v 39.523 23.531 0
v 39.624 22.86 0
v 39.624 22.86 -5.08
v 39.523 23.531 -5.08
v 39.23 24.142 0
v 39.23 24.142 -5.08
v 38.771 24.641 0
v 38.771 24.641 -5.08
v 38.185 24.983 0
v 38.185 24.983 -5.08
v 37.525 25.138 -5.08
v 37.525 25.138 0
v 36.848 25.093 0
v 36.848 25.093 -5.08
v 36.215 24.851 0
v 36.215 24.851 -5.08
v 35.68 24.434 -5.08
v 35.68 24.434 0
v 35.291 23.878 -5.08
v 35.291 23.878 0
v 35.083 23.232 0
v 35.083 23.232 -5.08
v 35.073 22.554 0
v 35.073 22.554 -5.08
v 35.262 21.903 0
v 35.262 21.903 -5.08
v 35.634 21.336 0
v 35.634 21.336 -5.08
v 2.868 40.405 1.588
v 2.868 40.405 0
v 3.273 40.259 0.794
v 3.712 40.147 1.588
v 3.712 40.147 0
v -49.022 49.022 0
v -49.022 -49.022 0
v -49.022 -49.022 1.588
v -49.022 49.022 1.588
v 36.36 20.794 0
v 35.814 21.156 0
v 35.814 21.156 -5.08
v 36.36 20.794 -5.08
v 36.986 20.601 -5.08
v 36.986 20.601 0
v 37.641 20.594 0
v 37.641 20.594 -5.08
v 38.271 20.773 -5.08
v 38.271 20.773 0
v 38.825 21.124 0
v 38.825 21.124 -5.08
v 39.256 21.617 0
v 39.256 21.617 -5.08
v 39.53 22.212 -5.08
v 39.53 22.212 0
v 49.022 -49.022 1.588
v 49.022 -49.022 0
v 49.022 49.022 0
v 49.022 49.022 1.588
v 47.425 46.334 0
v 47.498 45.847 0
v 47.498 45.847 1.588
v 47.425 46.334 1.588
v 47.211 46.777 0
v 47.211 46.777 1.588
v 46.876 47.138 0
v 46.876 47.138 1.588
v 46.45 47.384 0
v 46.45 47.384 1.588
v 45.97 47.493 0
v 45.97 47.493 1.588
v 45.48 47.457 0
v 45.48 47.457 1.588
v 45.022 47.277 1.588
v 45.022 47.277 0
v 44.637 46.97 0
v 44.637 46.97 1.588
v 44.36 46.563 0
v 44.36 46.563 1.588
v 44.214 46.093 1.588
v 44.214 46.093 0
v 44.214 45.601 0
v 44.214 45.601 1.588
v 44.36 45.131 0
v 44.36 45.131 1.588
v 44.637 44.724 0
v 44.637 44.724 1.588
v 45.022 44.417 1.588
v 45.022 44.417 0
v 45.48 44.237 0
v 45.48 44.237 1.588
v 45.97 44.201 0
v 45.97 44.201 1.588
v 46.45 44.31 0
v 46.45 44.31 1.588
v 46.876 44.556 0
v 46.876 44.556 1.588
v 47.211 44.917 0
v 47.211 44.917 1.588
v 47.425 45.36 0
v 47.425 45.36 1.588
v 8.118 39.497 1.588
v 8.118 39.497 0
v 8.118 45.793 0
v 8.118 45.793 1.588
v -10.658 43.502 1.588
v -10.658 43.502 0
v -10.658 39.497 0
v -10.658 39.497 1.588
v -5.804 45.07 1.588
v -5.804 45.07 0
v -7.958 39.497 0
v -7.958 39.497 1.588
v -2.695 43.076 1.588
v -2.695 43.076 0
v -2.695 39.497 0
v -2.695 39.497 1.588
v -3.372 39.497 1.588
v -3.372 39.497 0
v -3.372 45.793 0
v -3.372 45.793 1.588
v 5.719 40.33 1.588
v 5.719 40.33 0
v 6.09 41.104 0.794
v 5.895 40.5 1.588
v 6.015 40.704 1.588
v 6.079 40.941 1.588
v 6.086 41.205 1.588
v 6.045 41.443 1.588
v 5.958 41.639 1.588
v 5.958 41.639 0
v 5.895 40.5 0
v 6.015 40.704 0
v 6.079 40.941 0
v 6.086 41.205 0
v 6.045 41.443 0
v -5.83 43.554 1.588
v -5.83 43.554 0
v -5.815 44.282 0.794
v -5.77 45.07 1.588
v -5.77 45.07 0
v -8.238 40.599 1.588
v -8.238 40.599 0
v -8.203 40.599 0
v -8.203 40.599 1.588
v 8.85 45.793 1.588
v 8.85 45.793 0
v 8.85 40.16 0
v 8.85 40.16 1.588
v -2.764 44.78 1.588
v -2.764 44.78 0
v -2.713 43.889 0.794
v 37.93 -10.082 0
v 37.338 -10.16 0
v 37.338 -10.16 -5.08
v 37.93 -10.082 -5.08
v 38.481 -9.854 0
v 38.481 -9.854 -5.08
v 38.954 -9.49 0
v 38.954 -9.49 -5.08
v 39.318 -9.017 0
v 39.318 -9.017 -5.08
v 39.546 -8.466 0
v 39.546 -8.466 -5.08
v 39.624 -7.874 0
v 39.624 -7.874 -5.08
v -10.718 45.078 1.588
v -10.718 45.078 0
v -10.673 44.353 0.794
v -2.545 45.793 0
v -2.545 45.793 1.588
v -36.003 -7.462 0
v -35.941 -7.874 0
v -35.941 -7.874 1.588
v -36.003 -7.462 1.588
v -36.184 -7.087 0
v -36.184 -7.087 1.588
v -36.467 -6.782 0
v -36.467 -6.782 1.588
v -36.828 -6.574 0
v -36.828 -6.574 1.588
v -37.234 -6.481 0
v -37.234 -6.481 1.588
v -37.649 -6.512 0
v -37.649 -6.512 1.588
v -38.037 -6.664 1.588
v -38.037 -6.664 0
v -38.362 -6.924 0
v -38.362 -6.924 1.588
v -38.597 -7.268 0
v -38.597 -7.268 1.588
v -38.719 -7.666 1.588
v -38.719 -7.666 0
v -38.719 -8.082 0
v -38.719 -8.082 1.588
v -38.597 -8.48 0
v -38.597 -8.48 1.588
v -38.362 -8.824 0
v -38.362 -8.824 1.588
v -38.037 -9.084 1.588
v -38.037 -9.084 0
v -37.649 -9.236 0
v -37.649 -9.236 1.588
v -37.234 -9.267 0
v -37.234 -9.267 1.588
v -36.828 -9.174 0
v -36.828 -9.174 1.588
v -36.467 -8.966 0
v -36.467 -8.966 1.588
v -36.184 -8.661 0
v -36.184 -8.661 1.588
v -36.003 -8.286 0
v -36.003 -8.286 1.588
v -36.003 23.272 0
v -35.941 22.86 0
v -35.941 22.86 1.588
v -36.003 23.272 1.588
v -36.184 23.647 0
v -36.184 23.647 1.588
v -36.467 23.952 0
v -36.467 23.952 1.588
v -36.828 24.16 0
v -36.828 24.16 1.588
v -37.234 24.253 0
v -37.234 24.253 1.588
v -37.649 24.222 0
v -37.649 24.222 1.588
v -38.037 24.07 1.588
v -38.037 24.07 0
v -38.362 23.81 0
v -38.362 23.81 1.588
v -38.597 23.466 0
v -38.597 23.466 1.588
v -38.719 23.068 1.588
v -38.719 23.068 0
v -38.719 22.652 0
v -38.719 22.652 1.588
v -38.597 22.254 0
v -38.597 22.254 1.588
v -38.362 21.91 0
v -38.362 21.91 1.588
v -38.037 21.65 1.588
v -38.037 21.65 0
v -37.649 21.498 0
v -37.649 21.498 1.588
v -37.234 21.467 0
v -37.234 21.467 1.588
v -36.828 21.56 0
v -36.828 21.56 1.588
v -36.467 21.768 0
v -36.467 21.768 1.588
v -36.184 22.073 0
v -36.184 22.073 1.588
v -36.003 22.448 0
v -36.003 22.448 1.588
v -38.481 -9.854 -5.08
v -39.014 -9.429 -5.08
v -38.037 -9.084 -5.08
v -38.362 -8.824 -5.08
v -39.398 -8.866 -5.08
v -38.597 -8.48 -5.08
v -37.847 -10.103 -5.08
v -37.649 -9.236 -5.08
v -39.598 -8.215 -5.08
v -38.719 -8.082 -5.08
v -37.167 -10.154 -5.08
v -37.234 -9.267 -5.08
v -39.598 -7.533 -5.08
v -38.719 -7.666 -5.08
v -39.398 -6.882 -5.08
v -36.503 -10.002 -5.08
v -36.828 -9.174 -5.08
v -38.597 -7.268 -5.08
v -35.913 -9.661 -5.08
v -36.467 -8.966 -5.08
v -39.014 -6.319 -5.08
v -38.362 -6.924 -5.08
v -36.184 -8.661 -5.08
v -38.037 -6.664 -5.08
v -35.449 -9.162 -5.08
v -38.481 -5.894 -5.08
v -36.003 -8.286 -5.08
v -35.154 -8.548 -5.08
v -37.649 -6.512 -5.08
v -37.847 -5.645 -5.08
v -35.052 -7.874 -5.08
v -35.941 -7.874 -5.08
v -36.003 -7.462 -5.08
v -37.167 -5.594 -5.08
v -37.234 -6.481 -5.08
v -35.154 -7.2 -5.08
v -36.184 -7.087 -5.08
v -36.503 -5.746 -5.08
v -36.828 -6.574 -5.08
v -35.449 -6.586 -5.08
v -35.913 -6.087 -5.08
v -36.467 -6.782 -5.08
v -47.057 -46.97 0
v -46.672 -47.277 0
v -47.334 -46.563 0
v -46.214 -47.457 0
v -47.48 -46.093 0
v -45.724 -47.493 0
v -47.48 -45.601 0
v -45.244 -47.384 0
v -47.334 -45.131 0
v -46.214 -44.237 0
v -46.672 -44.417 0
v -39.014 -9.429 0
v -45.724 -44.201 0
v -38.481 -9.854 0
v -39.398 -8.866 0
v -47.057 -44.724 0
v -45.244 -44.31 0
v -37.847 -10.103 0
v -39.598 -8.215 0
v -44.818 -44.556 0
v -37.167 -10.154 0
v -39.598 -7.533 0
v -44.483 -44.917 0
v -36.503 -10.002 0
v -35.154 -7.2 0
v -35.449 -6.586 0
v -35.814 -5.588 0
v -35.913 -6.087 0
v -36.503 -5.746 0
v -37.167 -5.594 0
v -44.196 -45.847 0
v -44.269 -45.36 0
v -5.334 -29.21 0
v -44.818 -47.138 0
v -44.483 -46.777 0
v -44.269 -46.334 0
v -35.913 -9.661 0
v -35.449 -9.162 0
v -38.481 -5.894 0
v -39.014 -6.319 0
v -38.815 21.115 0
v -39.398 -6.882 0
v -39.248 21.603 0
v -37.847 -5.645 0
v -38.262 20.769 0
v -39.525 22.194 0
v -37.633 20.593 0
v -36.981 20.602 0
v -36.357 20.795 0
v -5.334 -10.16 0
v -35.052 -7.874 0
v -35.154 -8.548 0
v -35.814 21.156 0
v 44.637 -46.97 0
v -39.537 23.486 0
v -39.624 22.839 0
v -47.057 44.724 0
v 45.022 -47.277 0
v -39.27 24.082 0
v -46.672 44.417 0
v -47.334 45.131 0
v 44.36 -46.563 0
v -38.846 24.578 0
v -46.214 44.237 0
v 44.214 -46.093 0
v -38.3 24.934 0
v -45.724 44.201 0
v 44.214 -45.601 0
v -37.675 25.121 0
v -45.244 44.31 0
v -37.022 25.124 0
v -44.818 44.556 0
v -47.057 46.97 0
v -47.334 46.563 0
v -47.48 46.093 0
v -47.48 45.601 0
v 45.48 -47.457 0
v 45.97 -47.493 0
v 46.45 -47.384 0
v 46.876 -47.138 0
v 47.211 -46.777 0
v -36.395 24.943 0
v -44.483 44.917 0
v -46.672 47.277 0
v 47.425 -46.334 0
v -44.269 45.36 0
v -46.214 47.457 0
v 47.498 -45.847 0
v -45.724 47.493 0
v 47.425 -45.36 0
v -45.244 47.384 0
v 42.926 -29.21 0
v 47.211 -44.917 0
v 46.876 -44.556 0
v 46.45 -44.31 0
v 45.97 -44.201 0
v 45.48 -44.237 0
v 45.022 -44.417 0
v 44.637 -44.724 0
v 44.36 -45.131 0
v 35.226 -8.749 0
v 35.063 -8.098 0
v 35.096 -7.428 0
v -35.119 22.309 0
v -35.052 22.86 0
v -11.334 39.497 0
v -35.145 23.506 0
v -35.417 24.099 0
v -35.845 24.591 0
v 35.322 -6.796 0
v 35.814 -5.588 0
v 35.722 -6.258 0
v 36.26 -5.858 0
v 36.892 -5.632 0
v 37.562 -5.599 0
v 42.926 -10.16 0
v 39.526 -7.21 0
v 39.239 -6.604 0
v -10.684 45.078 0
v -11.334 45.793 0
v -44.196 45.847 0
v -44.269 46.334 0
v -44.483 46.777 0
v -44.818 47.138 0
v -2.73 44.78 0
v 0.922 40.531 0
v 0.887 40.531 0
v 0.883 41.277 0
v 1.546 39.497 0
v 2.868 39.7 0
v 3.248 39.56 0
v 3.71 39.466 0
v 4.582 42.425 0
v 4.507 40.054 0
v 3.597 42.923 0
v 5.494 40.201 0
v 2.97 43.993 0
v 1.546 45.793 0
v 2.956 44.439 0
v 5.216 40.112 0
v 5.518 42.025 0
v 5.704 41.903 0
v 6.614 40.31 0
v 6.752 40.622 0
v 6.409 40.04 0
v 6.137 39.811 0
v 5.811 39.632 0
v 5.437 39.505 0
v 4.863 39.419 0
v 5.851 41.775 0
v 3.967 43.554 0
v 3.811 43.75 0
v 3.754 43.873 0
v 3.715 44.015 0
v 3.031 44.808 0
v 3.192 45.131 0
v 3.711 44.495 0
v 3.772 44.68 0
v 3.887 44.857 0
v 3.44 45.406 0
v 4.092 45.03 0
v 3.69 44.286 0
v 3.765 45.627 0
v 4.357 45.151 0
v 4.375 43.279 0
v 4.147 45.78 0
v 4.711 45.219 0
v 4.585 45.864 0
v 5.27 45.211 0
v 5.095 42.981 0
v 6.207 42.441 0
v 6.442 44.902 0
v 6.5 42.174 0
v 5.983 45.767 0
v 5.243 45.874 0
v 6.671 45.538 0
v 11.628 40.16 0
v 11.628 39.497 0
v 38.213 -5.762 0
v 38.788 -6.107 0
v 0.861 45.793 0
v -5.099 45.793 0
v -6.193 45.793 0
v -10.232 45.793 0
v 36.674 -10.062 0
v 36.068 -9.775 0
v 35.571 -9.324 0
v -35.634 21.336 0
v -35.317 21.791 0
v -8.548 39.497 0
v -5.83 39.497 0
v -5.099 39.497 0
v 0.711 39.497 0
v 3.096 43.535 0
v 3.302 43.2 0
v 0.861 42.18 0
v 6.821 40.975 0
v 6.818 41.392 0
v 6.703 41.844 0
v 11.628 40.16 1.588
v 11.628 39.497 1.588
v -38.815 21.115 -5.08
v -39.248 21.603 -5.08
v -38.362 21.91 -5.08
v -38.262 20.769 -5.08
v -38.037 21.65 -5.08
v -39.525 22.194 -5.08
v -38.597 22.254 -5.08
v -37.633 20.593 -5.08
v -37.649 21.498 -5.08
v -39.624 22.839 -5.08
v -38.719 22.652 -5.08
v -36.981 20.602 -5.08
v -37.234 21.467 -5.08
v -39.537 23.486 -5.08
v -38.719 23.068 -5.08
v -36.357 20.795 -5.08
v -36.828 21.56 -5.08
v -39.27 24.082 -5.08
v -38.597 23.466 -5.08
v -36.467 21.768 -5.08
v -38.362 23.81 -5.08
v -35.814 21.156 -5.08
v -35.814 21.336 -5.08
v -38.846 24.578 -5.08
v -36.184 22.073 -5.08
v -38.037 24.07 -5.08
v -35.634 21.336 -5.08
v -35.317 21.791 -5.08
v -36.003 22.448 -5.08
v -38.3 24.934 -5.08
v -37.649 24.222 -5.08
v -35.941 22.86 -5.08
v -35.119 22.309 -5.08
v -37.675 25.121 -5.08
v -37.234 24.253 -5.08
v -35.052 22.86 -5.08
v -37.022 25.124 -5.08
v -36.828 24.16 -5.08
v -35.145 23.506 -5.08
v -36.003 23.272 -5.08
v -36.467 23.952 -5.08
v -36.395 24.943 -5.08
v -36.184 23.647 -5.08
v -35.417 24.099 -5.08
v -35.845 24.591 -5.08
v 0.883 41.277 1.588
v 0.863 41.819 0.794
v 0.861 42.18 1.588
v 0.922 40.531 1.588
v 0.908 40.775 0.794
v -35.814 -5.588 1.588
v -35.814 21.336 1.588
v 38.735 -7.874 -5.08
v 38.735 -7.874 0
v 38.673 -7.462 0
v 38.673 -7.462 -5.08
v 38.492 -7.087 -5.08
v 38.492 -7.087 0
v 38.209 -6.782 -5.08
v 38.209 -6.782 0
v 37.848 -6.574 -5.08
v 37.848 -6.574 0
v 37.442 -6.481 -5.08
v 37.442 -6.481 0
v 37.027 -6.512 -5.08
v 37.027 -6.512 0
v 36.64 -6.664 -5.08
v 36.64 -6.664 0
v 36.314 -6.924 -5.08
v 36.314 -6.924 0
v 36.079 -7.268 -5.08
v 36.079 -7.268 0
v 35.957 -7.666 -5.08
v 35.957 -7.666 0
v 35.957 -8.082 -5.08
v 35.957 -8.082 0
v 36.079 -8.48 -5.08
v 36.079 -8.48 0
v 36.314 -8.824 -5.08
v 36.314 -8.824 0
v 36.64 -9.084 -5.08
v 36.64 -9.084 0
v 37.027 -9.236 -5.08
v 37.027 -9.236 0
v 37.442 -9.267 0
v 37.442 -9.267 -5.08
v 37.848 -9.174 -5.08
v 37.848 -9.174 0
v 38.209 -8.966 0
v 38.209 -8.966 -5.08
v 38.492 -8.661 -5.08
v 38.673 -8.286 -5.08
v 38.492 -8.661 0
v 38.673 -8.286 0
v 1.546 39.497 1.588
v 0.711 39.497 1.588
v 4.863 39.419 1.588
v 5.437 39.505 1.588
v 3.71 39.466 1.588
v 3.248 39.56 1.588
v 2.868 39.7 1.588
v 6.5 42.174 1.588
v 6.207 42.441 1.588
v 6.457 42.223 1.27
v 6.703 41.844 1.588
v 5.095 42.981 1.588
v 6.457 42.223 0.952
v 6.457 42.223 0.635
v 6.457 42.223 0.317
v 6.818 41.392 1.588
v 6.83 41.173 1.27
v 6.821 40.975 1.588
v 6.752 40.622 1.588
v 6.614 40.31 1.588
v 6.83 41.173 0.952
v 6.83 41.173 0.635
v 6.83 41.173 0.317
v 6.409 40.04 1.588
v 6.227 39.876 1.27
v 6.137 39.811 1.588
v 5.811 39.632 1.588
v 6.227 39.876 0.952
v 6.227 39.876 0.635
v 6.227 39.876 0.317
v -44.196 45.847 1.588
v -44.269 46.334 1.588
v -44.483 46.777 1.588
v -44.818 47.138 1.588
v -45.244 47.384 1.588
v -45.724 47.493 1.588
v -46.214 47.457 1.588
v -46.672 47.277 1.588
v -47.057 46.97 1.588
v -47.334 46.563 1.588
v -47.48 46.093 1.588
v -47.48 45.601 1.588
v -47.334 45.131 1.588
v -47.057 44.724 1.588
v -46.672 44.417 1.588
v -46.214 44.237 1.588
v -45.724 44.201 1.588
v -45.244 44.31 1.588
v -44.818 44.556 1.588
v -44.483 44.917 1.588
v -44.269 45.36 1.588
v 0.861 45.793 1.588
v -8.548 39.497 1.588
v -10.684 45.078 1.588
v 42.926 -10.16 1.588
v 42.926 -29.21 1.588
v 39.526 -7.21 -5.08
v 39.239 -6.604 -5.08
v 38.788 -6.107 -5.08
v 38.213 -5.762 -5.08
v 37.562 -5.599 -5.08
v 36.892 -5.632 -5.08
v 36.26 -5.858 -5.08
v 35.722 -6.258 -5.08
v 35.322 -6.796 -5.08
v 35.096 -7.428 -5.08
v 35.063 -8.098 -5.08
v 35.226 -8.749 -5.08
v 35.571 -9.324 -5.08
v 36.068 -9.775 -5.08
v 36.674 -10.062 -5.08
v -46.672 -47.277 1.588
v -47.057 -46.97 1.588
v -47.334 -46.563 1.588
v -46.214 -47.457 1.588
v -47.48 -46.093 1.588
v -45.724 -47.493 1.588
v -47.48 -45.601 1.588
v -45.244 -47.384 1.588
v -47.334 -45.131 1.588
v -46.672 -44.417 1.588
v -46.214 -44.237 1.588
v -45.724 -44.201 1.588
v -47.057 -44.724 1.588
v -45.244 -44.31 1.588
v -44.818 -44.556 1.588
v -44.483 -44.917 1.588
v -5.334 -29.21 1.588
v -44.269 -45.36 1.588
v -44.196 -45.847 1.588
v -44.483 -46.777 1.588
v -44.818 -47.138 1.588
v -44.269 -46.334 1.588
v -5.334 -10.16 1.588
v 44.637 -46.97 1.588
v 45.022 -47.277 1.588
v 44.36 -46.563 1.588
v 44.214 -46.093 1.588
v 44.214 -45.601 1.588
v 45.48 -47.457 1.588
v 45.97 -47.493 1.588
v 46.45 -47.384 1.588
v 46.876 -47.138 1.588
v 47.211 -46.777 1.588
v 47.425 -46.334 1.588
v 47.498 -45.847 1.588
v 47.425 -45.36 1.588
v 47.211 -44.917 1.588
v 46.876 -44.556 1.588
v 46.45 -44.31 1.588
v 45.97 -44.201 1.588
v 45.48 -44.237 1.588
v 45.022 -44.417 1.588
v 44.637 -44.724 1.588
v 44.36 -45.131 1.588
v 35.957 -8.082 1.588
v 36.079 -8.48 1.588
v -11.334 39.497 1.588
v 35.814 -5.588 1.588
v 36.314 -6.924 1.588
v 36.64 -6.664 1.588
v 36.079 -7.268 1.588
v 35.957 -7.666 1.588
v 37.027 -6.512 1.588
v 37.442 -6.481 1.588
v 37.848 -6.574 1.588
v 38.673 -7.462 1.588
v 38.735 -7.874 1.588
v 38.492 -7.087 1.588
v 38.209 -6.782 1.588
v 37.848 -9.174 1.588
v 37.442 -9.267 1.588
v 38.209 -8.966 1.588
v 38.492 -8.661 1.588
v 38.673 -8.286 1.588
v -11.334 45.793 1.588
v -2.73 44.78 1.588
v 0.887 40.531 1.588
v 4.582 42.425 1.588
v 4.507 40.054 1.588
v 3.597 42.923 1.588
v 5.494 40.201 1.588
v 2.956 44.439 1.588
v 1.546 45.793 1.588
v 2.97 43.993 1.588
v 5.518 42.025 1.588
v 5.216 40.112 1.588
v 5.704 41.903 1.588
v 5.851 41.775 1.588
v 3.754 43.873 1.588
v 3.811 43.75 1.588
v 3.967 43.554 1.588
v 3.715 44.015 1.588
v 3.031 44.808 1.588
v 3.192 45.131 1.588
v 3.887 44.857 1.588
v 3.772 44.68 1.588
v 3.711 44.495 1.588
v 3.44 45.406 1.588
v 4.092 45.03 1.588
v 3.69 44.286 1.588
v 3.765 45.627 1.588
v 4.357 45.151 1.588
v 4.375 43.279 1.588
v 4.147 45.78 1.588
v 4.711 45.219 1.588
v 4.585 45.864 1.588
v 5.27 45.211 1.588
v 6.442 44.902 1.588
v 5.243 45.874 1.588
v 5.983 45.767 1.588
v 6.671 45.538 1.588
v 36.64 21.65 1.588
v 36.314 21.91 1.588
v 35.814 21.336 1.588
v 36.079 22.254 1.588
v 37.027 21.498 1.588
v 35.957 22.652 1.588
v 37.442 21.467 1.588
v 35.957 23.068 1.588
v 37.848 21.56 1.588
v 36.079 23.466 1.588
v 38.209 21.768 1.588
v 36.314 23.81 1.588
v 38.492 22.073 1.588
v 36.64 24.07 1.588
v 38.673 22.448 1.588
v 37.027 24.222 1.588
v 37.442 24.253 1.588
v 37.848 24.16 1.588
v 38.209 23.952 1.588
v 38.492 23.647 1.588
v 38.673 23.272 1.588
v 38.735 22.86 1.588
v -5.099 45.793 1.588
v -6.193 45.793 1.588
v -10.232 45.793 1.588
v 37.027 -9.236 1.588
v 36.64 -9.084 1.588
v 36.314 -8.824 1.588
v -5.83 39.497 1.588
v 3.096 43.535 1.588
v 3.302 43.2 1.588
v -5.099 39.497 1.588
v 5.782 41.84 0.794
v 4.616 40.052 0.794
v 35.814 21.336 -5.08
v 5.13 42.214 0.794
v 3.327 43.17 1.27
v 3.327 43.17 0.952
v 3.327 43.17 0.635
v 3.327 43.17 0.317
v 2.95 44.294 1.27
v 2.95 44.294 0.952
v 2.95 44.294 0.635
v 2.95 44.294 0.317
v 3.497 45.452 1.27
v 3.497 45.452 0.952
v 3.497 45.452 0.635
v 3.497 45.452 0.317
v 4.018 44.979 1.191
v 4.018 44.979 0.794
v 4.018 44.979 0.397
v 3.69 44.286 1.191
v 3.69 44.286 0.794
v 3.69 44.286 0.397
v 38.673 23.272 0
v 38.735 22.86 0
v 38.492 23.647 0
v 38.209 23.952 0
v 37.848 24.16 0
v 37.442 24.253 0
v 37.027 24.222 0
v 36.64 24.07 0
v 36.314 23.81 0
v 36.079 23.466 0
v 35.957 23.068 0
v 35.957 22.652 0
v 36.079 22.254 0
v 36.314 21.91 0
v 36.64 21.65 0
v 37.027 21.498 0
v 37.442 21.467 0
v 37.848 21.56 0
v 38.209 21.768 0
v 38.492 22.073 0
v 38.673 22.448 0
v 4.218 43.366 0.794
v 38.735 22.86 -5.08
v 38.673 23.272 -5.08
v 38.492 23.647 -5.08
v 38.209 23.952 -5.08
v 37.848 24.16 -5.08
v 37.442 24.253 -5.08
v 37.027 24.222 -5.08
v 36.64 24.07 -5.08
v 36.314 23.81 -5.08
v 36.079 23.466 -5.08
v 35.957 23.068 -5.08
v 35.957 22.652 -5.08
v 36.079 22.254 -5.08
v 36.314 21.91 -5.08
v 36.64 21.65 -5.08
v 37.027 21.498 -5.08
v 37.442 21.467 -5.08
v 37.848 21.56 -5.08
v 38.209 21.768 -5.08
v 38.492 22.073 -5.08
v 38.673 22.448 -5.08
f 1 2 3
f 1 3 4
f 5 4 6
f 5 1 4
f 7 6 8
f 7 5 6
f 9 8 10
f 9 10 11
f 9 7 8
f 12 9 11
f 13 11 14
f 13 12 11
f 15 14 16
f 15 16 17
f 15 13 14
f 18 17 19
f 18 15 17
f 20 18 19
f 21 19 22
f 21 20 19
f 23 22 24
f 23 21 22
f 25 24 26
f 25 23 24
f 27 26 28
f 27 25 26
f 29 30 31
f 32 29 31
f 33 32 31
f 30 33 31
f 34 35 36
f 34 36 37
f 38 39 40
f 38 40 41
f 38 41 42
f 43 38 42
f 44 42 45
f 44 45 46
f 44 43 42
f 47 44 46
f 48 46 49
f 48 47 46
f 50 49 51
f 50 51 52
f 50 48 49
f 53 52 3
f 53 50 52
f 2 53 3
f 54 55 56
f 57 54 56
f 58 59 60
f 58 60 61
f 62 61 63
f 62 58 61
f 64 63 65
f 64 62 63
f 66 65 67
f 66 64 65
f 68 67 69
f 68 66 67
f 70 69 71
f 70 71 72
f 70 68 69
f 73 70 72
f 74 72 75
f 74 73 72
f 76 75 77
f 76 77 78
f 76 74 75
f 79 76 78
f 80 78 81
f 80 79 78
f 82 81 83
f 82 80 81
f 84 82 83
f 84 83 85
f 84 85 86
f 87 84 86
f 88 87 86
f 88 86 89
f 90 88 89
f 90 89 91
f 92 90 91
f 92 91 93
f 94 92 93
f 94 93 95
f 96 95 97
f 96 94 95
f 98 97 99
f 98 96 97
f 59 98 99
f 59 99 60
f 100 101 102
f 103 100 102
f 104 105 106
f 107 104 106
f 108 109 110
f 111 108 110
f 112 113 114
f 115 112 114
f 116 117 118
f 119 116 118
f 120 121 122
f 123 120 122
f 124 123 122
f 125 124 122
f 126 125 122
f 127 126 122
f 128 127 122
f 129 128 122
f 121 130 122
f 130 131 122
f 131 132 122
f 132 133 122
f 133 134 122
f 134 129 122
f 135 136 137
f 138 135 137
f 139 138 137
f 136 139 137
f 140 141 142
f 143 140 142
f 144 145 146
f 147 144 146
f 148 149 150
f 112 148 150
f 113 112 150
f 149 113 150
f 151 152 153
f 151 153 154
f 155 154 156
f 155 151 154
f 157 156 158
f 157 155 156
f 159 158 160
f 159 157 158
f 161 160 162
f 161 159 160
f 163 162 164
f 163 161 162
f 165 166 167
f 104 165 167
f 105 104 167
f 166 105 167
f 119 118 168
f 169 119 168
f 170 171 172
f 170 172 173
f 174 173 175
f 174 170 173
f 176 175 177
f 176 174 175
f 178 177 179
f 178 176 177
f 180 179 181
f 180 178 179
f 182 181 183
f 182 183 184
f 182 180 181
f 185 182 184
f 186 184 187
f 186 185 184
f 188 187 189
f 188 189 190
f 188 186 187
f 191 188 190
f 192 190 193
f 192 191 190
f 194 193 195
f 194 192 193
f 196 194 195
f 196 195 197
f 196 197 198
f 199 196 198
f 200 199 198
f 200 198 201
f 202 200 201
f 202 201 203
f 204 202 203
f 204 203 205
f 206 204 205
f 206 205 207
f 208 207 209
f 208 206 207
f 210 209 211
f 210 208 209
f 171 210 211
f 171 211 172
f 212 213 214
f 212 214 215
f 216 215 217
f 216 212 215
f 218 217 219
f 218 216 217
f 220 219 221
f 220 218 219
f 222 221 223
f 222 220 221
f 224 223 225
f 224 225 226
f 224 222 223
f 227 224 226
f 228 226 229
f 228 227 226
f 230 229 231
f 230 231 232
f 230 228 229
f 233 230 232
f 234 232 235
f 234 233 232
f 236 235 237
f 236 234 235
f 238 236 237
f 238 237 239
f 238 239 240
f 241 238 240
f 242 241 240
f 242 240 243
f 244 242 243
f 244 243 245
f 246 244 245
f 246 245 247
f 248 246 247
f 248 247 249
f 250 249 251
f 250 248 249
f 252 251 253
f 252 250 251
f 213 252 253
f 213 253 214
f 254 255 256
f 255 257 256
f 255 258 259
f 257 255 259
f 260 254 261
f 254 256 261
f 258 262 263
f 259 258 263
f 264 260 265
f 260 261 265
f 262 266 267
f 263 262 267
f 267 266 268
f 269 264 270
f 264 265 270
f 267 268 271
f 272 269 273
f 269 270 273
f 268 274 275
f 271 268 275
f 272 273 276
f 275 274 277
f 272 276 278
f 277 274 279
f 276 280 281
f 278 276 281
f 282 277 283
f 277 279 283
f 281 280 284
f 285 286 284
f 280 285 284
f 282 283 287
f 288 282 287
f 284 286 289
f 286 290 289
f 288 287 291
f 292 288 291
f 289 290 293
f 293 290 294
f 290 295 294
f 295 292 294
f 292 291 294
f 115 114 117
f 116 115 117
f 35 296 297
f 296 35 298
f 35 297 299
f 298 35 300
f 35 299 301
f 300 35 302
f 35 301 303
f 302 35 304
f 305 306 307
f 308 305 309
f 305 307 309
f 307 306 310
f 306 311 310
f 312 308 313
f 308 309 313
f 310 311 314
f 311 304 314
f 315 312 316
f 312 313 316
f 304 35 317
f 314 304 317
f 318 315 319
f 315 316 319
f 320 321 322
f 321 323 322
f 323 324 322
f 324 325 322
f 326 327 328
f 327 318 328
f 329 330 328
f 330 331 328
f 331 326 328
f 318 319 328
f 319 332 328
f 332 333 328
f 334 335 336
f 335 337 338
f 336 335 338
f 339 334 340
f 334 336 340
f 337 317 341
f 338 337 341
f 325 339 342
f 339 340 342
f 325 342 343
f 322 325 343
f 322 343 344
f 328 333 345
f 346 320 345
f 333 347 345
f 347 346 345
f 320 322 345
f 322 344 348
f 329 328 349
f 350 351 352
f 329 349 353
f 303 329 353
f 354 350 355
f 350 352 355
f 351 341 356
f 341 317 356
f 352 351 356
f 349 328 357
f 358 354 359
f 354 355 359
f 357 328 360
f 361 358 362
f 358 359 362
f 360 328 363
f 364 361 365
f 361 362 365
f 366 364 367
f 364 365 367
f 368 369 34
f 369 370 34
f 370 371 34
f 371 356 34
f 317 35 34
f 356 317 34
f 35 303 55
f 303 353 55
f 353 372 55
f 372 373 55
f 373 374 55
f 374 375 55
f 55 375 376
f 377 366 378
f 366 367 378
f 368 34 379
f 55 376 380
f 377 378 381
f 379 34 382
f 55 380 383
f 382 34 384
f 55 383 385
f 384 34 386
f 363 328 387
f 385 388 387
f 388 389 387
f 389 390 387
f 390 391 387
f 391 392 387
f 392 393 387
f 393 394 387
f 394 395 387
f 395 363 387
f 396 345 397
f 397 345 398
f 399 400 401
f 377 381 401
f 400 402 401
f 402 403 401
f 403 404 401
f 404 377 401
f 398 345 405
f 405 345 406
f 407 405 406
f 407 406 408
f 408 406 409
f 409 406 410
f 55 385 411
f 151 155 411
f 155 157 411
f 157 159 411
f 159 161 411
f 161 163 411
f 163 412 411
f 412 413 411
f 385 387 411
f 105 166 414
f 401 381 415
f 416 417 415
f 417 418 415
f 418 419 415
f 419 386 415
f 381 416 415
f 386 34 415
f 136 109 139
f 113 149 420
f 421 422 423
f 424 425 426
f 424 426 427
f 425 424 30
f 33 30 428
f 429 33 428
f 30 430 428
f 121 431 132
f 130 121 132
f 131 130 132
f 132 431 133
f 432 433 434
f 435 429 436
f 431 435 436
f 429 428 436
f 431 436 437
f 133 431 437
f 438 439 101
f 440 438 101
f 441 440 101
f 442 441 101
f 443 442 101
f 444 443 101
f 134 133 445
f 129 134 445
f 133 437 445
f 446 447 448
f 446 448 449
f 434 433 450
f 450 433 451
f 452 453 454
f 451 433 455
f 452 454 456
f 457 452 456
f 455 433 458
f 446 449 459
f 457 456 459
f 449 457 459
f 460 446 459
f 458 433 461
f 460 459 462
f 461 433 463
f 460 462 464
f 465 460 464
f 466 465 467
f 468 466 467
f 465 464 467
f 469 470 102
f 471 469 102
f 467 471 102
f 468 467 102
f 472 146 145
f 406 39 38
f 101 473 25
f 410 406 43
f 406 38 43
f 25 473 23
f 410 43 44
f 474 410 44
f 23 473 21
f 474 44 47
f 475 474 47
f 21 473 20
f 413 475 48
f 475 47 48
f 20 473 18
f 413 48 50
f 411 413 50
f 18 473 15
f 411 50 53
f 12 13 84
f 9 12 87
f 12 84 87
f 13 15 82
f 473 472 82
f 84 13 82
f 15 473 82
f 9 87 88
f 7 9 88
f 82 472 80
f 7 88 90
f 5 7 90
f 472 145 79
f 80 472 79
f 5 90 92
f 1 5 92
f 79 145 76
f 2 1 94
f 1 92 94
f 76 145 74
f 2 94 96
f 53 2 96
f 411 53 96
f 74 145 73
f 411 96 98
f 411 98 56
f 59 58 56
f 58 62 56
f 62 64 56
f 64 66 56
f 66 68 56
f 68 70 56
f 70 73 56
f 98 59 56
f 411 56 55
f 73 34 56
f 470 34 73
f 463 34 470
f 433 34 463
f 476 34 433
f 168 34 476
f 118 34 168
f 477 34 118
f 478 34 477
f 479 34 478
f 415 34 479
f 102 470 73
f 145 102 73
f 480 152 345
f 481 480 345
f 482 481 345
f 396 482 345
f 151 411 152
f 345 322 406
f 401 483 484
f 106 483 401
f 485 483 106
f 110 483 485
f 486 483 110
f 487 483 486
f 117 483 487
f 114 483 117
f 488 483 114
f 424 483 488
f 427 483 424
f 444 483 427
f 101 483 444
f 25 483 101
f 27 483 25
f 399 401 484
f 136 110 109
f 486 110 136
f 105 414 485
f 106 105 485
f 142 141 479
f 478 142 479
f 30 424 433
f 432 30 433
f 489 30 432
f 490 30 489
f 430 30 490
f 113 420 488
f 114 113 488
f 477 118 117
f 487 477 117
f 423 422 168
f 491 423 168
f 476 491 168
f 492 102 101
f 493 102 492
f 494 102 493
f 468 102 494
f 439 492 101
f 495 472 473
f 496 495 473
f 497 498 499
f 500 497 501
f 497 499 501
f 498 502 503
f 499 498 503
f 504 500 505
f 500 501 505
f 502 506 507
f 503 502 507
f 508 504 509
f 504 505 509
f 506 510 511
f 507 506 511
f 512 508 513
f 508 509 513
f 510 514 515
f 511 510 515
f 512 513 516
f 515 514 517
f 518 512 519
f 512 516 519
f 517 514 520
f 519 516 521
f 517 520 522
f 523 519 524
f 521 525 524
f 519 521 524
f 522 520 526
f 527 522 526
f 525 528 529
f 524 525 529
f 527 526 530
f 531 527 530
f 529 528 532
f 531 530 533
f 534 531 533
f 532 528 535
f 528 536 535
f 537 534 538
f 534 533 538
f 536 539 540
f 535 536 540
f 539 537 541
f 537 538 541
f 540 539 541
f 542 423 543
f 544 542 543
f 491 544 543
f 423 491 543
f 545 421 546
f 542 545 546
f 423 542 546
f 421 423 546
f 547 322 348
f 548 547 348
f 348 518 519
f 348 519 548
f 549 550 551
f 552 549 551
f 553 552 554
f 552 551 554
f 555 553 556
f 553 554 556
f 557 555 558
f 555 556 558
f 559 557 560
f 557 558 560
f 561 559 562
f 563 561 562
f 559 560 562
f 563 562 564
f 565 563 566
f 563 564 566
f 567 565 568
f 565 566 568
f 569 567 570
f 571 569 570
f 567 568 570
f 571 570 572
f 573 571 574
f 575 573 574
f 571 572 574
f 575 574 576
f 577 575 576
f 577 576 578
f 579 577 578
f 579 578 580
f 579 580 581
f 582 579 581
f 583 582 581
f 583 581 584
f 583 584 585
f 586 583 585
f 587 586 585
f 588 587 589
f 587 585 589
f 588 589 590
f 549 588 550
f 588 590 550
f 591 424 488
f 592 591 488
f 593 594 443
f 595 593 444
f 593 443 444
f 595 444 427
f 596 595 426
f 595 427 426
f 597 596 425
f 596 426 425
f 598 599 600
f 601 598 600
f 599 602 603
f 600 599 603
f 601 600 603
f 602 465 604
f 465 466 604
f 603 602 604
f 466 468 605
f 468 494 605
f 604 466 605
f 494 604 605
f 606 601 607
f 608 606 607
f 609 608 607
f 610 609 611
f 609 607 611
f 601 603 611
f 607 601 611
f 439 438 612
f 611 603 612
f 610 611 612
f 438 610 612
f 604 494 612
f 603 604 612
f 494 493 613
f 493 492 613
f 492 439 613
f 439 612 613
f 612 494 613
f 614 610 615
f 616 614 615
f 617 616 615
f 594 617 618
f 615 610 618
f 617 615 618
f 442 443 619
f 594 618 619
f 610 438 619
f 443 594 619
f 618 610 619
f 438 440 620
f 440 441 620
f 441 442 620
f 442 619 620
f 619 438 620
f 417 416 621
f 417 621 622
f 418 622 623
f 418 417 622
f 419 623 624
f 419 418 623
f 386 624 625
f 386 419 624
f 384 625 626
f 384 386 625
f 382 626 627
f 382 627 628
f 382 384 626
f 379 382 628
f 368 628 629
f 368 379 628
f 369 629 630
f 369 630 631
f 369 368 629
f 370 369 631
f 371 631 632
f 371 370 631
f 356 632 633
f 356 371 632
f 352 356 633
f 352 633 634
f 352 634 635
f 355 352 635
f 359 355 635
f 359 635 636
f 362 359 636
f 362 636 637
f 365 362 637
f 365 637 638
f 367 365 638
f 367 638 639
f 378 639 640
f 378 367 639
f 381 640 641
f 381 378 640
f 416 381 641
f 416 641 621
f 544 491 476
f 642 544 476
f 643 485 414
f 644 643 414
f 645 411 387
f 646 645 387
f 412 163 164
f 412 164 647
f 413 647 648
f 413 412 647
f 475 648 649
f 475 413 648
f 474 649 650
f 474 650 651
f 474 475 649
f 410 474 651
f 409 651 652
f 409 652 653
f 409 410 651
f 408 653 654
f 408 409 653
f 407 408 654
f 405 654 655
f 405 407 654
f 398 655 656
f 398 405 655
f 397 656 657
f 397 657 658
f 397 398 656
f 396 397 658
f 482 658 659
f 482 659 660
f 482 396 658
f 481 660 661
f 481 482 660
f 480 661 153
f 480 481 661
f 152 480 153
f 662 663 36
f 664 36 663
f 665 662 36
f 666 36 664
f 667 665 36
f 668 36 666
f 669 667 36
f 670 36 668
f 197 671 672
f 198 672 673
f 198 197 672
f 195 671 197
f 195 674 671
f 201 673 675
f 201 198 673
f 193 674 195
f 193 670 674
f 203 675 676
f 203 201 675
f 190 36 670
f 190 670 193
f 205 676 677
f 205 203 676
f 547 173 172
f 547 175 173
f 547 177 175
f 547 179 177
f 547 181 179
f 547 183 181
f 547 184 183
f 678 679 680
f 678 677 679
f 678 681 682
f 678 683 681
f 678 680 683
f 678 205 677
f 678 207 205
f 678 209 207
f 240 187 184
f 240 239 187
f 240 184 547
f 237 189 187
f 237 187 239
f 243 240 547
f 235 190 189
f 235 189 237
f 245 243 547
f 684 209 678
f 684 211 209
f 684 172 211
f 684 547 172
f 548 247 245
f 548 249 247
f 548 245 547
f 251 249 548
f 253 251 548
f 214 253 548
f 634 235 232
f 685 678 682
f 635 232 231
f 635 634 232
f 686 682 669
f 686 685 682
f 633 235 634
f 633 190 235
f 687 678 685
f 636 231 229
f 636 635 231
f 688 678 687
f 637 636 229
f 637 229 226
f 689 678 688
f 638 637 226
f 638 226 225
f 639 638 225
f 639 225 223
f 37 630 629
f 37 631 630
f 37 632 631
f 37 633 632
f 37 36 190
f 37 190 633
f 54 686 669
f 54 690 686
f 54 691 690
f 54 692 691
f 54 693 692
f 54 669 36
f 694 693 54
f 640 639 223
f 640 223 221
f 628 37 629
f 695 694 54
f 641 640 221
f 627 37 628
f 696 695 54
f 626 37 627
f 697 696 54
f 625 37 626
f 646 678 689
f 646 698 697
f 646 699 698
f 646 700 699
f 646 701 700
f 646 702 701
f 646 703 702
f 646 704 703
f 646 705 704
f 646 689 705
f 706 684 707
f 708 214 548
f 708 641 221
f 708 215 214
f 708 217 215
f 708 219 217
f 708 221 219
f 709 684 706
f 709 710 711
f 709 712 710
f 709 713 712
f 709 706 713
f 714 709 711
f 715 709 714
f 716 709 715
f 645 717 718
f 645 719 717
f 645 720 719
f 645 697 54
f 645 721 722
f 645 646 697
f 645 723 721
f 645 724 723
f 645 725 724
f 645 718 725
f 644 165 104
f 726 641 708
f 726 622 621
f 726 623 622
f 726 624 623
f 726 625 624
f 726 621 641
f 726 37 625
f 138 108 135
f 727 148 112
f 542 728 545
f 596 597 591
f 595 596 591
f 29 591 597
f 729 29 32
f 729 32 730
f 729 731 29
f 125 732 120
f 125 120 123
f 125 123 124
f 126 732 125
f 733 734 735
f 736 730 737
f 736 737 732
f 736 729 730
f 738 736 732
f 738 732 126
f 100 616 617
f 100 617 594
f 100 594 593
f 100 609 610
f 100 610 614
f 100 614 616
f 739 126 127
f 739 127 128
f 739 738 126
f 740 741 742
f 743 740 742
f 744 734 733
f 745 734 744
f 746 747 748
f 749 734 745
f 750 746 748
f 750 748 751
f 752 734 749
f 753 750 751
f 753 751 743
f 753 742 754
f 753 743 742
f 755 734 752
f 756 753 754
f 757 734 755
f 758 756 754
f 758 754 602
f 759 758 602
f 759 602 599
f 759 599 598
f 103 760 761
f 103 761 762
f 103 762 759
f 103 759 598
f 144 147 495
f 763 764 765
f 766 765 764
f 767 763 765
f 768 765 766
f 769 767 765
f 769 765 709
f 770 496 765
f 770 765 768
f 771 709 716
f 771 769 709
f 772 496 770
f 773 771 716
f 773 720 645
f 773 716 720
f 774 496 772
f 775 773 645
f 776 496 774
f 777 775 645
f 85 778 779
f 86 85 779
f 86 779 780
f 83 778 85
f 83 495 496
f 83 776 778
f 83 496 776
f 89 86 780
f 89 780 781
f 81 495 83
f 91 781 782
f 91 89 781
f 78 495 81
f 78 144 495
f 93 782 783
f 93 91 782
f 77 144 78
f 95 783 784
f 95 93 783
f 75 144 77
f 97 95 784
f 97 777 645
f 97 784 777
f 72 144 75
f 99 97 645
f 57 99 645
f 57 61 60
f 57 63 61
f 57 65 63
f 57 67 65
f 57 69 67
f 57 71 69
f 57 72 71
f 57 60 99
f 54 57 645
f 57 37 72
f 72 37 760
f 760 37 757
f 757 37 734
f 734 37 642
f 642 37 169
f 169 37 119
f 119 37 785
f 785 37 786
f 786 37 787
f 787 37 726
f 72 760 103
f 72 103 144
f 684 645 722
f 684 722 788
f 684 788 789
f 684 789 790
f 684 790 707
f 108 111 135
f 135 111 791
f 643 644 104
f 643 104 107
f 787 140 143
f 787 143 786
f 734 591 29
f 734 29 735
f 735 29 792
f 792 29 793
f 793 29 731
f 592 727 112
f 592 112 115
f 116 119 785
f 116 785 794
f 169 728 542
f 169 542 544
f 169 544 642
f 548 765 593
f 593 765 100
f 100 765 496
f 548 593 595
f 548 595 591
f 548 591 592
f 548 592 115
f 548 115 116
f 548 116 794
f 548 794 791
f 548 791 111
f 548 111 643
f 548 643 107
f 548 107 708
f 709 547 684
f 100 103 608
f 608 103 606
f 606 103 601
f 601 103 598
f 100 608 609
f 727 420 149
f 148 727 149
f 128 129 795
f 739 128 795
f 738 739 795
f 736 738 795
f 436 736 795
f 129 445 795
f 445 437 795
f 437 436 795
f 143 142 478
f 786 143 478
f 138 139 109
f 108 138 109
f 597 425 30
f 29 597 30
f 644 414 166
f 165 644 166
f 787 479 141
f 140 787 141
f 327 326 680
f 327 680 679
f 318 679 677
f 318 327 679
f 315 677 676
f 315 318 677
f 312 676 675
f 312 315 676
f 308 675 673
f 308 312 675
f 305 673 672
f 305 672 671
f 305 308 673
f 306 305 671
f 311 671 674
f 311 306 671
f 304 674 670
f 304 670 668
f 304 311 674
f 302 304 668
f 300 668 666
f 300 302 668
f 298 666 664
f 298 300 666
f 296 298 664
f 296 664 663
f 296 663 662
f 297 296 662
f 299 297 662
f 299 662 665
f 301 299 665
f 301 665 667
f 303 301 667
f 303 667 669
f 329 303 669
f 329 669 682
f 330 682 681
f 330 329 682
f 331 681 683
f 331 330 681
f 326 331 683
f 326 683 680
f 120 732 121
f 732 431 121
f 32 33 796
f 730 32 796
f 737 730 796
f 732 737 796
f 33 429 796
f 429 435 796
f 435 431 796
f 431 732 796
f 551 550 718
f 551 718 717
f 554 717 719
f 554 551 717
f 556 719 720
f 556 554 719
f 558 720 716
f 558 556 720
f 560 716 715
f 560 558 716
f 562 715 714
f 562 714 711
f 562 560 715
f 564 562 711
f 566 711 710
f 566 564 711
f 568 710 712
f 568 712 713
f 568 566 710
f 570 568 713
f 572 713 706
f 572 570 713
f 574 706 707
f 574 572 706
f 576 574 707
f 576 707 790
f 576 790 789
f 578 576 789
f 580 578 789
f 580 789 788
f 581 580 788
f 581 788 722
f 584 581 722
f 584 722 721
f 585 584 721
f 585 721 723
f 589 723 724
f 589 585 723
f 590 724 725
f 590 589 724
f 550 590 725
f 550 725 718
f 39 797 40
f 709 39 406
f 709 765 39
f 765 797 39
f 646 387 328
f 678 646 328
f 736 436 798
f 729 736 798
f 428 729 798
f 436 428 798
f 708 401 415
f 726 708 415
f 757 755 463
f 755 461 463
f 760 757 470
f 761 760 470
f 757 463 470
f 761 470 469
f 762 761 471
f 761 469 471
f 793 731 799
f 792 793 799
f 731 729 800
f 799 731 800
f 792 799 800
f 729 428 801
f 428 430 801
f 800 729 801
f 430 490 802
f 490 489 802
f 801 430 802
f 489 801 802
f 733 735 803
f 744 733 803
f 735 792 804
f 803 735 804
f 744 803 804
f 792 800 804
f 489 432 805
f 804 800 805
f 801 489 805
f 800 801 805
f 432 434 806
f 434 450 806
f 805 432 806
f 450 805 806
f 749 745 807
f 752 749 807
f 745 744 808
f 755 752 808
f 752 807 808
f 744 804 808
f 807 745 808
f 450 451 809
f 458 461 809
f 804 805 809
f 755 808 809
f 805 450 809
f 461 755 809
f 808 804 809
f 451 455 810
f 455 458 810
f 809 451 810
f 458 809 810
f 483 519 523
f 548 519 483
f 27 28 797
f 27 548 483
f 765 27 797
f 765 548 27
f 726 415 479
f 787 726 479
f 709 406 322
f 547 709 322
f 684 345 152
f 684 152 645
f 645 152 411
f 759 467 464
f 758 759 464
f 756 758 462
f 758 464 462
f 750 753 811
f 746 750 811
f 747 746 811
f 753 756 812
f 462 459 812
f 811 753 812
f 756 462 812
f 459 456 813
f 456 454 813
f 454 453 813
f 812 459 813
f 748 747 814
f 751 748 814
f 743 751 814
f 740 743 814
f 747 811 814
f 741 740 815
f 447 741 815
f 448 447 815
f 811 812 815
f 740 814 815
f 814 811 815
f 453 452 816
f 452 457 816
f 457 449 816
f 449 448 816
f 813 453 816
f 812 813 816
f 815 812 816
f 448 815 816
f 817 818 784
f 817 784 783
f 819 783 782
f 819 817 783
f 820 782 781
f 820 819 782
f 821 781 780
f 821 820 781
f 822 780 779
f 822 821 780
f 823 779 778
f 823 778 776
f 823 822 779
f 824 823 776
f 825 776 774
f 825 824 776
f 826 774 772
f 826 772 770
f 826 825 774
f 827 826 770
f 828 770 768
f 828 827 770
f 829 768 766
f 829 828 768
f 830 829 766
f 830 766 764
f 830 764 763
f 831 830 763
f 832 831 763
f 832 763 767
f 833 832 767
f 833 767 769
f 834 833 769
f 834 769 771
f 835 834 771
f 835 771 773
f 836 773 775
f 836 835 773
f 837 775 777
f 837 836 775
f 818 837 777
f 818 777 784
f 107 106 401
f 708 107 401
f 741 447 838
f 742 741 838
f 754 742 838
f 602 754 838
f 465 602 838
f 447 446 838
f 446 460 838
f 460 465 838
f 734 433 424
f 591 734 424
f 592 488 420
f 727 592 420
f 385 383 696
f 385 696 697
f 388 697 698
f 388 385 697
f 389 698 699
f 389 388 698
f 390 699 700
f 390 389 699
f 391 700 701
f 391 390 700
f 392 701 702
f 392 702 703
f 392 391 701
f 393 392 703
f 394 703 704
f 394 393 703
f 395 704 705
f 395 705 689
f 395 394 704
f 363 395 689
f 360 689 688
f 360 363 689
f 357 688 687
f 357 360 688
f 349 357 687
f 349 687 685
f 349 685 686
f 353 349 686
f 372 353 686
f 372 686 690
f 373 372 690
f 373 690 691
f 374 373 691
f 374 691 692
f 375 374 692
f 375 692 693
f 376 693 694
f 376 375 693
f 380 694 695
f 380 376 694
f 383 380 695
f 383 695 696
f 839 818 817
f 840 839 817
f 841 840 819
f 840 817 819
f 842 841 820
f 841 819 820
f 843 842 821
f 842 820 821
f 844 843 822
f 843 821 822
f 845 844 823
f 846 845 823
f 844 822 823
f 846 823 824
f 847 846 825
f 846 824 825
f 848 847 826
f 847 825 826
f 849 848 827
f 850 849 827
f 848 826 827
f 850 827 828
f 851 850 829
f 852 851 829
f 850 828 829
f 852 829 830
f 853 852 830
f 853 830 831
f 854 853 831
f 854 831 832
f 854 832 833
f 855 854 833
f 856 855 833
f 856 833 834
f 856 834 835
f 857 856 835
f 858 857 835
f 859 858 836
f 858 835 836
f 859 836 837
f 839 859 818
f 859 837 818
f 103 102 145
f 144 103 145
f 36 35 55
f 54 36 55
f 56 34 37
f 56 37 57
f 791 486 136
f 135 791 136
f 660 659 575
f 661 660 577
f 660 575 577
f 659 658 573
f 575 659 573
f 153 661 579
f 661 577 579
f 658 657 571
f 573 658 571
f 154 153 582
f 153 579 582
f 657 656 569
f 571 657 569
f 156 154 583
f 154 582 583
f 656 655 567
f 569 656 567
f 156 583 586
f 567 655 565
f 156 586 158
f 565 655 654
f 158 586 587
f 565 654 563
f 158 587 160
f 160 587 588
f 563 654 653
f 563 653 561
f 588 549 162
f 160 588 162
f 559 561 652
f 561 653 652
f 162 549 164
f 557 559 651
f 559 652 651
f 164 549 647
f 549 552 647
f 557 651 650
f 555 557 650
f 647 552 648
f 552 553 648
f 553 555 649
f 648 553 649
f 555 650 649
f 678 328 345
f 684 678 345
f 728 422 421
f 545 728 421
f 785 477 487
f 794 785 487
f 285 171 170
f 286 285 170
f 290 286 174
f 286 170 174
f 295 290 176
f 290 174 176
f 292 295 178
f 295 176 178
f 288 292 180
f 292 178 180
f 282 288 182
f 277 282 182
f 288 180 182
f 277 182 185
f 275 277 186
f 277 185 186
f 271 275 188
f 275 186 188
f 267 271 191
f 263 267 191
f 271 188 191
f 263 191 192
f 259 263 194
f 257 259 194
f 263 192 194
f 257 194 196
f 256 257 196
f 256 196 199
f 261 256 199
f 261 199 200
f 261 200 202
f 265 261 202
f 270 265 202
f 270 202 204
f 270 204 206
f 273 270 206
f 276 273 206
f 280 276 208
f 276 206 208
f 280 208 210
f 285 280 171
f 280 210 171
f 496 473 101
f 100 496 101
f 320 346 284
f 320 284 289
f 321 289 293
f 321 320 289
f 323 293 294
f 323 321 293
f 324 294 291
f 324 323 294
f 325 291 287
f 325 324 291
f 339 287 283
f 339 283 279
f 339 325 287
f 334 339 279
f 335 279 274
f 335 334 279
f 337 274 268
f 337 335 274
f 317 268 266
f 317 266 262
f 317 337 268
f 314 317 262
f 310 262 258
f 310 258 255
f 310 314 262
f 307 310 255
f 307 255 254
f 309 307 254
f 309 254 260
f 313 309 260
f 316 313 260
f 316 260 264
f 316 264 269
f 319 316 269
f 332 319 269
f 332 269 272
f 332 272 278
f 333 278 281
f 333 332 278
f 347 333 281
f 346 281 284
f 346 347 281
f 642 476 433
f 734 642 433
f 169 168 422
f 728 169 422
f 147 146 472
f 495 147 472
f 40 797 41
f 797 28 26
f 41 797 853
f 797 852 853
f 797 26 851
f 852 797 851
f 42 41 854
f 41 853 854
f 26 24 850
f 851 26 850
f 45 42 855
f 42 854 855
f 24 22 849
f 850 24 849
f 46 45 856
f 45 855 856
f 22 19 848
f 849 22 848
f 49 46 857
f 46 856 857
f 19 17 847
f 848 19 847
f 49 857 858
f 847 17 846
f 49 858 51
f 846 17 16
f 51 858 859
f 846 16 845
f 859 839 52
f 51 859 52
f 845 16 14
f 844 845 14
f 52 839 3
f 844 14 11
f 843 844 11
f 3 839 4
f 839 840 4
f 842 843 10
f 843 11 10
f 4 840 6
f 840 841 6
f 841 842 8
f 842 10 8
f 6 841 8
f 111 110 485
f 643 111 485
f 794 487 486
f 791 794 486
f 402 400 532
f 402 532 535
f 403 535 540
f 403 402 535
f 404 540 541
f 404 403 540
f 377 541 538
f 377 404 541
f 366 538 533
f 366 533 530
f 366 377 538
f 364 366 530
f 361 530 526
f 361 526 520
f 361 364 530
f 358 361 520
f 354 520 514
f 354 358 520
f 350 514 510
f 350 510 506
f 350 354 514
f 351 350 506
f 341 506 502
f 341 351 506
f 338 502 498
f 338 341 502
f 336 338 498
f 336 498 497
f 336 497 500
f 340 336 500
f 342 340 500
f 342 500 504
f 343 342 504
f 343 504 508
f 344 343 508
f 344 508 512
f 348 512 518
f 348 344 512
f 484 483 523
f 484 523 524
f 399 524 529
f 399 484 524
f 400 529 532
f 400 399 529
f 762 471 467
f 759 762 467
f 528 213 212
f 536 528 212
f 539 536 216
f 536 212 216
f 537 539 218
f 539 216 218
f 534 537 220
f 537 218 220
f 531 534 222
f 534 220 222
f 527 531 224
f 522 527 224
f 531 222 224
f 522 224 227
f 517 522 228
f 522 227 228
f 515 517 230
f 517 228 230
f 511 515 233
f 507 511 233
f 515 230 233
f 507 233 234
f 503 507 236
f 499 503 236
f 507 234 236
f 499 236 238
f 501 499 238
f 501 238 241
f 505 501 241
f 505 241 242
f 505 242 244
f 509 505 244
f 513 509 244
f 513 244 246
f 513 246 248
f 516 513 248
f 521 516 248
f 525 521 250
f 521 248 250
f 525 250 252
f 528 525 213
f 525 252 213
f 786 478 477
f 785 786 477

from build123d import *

# Parameters (mm, degrees)
F0_W     = 98.044
F0_H     = 98.044
F0_R     = 1.651
F0_R_2   = 2.286
F0_R_3   = 1.397
F1_DEPTH = 1.5875
F2_DEPTH = 5.08


with BuildPart() as f1:
    # F0 (on Top) → F1 (new body)
    with BuildSketch(Plane.XY):
        Rectangle(F0_W, F0_H)
        with Locations((-45.847, -45.847)):
            Circle(F0_R, mode=Mode.SUBTRACT)
        with Locations((-37.338, -7.874)):
            Circle(F0_R_2, mode=Mode.SUBTRACT)
        with Locations((45.847, -45.847)):
            Circle(F0_R, mode=Mode.SUBTRACT)
        Polygon((-5.334, -29.21), (-5.334, -10.16), (37.3379999666, -10.16), (42.926, -10.16), (42.926, -29.21), align=None, mode=Mode.SUBTRACT)
        with BuildLine():
            ThreePointArc((39.624, -7.874), (38.95444609, -9.4904461136), (37.3379999666, -10.16))
            ThreePointArc((37.3379999666, -10.16), (35.72155391, -6.2575538864), (39.624, -7.874))
        make_face(mode=Mode.SUBTRACT)
        with Locations((-45.847, 45.847)):
            Circle(F0_R, mode=Mode.SUBTRACT)
        with BuildLine():
            Line((-7.9581705729, 39.497), (-8.5479709201, 39.497))
            Line((-8.5479709201, 39.497), (-10.6839301215, 45.0780546875))
            Line((-10.6839301215, 45.0780546875), (-10.7183810764, 45.0780546875))
            add(Edge.make_bspline(
                [(-10.7183810764, 45.0780546875), (-10.6577473958, 44.415218316), (-10.6577473958, 43.5015789931)],
                knots=[0, 0, 0, 1, 1, 1], degree=2))
            Line((-10.6577473958, 43.5015789931), (-10.6577473958, 39.497))
            Line((-10.6577473958, 39.497), (-11.3343641493, 39.497))
            Line((-11.3343641493, 39.497), (-11.3343641493, 45.7932565104))
            Line((-11.3343641493, 45.7932565104), (-10.2319335938, 45.7932565104))
            Line((-10.2319335938, 45.7932565104), (-8.2379123264, 40.5994305556))
            Line((-8.2379123264, 40.5994305556), (-8.2034613715, 40.5994305556))
            Line((-8.2034613715, 40.5994305556), (-6.1929036458, 45.7932565104))
            Line((-6.1929036458, 45.7932565104), (-5.0987413194, 45.7932565104))
            Line((-5.0987413194, 45.7932565104), (-5.0987413194, 39.497))
            Line((-5.0987413194, 39.497), (-5.8304796007, 39.497))
            Line((-5.8304796007, 39.497), (-5.8304796007, 43.5539444444))
            add(Edge.make_bspline(
                [(-5.8304796007, 43.5539444444), (-5.8304796007, 44.2512317708), (-5.7698459201, 45.0697864583)],
                knots=[0, 0, 0, 1, 1, 1], degree=2))
            Line((-5.7698459201, 45.0697864583), (-5.804296875, 45.0697864583))
            Line((-5.804296875, 45.0697864583), (-7.9581705729, 39.497))
        make_face(mode=Mode.SUBTRACT)
        with BuildLine():
            Line((1.5461588542, 45.7932565104), (1.5461588542, 39.497))
            Line((1.5461588542, 39.497), (0.7110677083, 39.497))
            Line((0.7110677083, 39.497), (-2.7298936632, 44.7803984375))
            Line((-2.7298936632, 44.7803984375), (-2.7643446181, 44.7803984375))
            add(Edge.make_bspline(
                [(-2.7643446181, 44.7803984375), (-2.6954427083, 43.8502226563), (-2.6954427083, 43.075765191)],
                knots=[0, 0, 0, 1, 1, 1], degree=2))
            Line((-2.6954427083, 43.075765191), (-2.6954427083, 39.497))
            Line((-2.6954427083, 39.497), (-3.3720594618, 39.497))
            Line((-3.3720594618, 39.497), (-3.3720594618, 45.7932565104))
            Line((-3.3720594618, 45.7932565104), (-2.5452365451, 45.7932565104))
            Line((-2.5452365451, 45.7932565104), (0.8874565972, 40.5305286458))
            Line((0.8874565972, 40.5305286458), (0.9219075521, 40.5305286458))
            add(Edge.make_bspline(
                [(0.9219075521, 40.5305286458), (0.9136393229, 40.6462838542), (0.8833224826, 41.2774253472)],
                knots=[0, 0, 0, 1, 1, 1], degree=2))
            add(Edge.make_bspline(
                [(0.8833224826, 41.2774253472), (0.8530056424, 41.9085668403), (0.8612738715, 42.1800403646)],
                knots=[0, 0, 0, 1, 1, 1], degree=2))
            Line((0.8612738715, 42.1800403646), (0.8612738715, 45.7932565104))
            Line((0.8612738715, 45.7932565104), (1.5461588542, 45.7932565104))
        make_face(mode=Mode.SUBTRACT)
        with BuildLine():
            ThreePointArc((-35.814, 21.1561162011), (-39.4248229441, 23.793255592), (-35.052, 22.86))
            ThreePointArc((-35.052, 22.86), (-35.2024819874, 22.0443047028), (-35.6341162011, 21.336))
            Line((-35.6341162011, 21.336), (35.6341162011, 21.336))
            ThreePointArc((35.6341162011, 21.336), (36.5223047028, 24.9955180126), (39.624, 22.86))
            ThreePointArc((39.624, 22.86), (38.271255592, 20.7731770559), (35.814, 21.1561162011))
            Line((35.814, 21.1561162011), (35.814, -5.588))
            Line((35.814, -5.588), (-35.814, -5.588))
            Line((-35.814, -5.588), (-35.814, 21.1561162011))
        make_face(mode=Mode.SUBTRACT)
        with BuildLine():
            add(Edge.make_bspline(
                [(6.4574869792, 42.2227595486), (6.8295572917, 41.8176163194), (6.8295572917, 41.1726944444)],
                knots=[0, 0, 0, 1, 1, 1], degree=2))
            add(Edge.make_bspline(
                [(6.8295572917, 41.1726944444), (6.8295572917, 40.3417374132), (6.2266655816, 39.8759605035)],
                knots=[0, 0, 0, 1, 1, 1], degree=2))
            add(Edge.make_bspline(
                [(6.2266655816, 39.8759605035), (5.6237738715, 39.4101835938), (4.5902452257, 39.4101835938)],
                knots=[0, 0, 0, 1, 1, 1], degree=2))
            add(Edge.make_bspline(
                [(4.5902452257, 39.4101835938), (3.4712782118, 39.4101835938), (2.8676974826, 39.6995716146)],
                knots=[0, 0, 0, 1, 1, 1], degree=2))
            Line((2.8676974826, 39.6995716146), (2.8676974826, 40.4051271701))
            add(Edge.make_bspline(
                [(2.8676974826, 40.4051271701), (3.2563042535, 40.2425186632), (3.7124348958, 40.1474340278)],
                knots=[0, 0, 0, 1, 1, 1], degree=2))
            add(Edge.make_bspline(
                [(3.7124348958, 40.1474340278), (4.1685655382, 40.0523493924), (4.6164279514, 40.0523493924)],
                knots=[0, 0, 0, 1, 1, 1], degree=2))
            add(Edge.make_bspline(
                [(4.6164279514, 40.0523493924), (5.3481662326, 40.0523493924), (5.7188585069, 40.3300240885)],
                knots=[0, 0, 0, 1, 1, 1], degree=2))
            add(Edge.make_bspline(
                [(5.7188585069, 40.3300240885), (6.0895507813, 40.6076987847), (6.0895507813, 41.1037925347)],
                knots=[0, 0, 0, 1, 1, 1], degree=2))
            add(Edge.make_bspline(
                [(6.0895507813, 41.1037925347), (6.0895507813, 41.4303875868), (5.9579481337, 41.6391603733)],
                knots=[0, 0, 0, 1, 1, 1], degree=2))
            add(Edge.make_bspline(
                [(5.9579481337, 41.6391603733), (5.8263454861, 41.8479331597), (5.5183539497, 42.0250110677)],
                knots=[0, 0, 0, 1, 1, 1], degree=2))
            add(Edge.make_bspline(
                [(5.5183539497, 42.0250110677), (5.2103624132, 42.2020889757), (4.5819769965, 42.4253311632)],
                knots=[0, 0, 0, 1, 1, 1], degree=2))
            add(Edge.make_bspline(
                [(4.5819769965, 42.4253311632), (3.7041666667, 42.7395238715), (3.3272732205, 43.1701608073)],
                knots=[0, 0, 0, 1, 1, 1], degree=2))
            add(Edge.make_bspline(
                [(3.3272732205, 43.1701608073), (2.9503797743, 43.6007977431), (2.9503797743, 44.2939509549)],
                knots=[0, 0, 0, 1, 1, 1], degree=2))
            add(Edge.make_bspline(
                [(2.9503797743, 44.2939509549), (2.9503797743, 45.0215551215), (3.4967719184, 45.4521920573)],
                knots=[0, 0, 0, 1, 1, 1], degree=2))
            add(Edge.make_bspline(
                [(3.4967719184, 45.4521920573), (4.0431640625, 45.8828289931), (4.9444010417, 45.8828289931)],
                knots=[0, 0, 0, 1, 1, 1], degree=2))
            add(Edge.make_bspline(
                [(4.9444010417, 45.8828289931), (5.8828450521, 45.8828289931), (6.6710828993, 45.5383194444)],
                knots=[0, 0, 0, 1, 1, 1], degree=2))
            Line((6.6710828993, 45.5383194444), (6.442328559, 44.9016657986))
            add(Edge.make_bspline(
                [(6.442328559, 44.9016657986), (5.662358941, 45.2282608507), (4.9264865451, 45.2282608507)],
                knots=[0, 0, 0, 1, 1, 1], degree=2))
            add(Edge.make_bspline(
                [(4.9264865451, 45.2282608507), (4.3449544271, 45.2282608507), (4.0176703559, 44.9788359375)],
                knots=[0, 0, 0, 1, 1, 1], degree=2))
            add(Edge.make_bspline(
                [(4.0176703559, 44.9788359375), (3.6903862847, 44.7294110243), (3.6903862847, 44.2856827257)],
                knots=[0, 0, 0, 1, 1, 1], degree=2))
            add(Edge.make_bspline(
                [(3.6903862847, 44.2856827257), (3.6903862847, 43.9590876736), (3.8109646267, 43.7496258681)],
                knots=[0, 0, 0, 1, 1, 1], degree=2))
            add(Edge.make_bspline(
                [(3.8109646267, 43.7496258681), (3.9315429688, 43.5401640625), (4.2181749132, 43.3658422309)],
                knots=[0, 0, 0, 1, 1, 1], degree=2))
            add(Edge.make_bspline(
                [(4.2181749132, 43.3658422309), (4.5048068576, 43.1915203993), (5.0946072049, 42.9806805556)],
                knots=[0, 0, 0, 1, 1, 1], degree=2))
            add(Edge.make_bspline(
                [(5.0946072049, 42.9806805556), (6.0854166667, 42.6279027778), (6.4574869792, 42.2227595486)],
                knots=[0, 0, 0, 1, 1, 1], degree=2))
        make_face(mode=Mode.SUBTRACT)
        Polygon((11.6278862847, 39.497), (8.1180230035, 39.497), (8.1180230035, 45.7932565104), (8.8497612847, 45.7932565104), (8.8497612847, 40.1598363715), (11.6278862847, 40.1598363715), align=None, mode=Mode.SUBTRACT)
        with Locations((45.847, 45.847)):
            Circle(F0_R, mode=Mode.SUBTRACT)
        with Locations((-37.338, -7.874)):
            Circle(F0_R_2)
        with Locations((-37.338, -7.874)):
            Circle(F0_R_3, mode=Mode.SUBTRACT)
        with BuildLine():
            ThreePointArc((39.624, -7.874), (35.72155391, -6.2575538864), (37.3379999666, -10.16))
            ThreePointArc((37.3379999666, -10.16), (38.95444609, -9.4904461136), (39.624, -7.874))
        make_face()
        with Locations((37.338, -7.874)):
            Circle(F0_R_3, mode=Mode.SUBTRACT)
        with BuildLine():
            ThreePointArc((39.624, 22.86), (36.5223047028, 24.9955180126), (35.6341162011, 21.336))
            Line((35.6341162011, 21.336), (35.814, 21.336))
            Line((35.814, 21.336), (35.814, 21.1561162011))
            ThreePointArc((35.814, 21.1561162011), (38.271255592, 20.7731770559), (39.624, 22.86))
        make_face()
        with Locations((37.338, 22.86)):
            Circle(F0_R_3, mode=Mode.SUBTRACT)
        with BuildLine():
            ThreePointArc((-35.6341162011, 21.336), (-35.2024819874, 22.0443047028), (-35.052, 22.86))
            ThreePointArc((-35.052, 22.86), (-39.4248229441, 23.793255592), (-35.814, 21.1561162011))
            Line((-35.814, 21.1561162011), (-35.814, 21.336))
            Line((-35.814, 21.336), (-35.6341162011, 21.336))
        make_face()
        with Locations((-37.338, 22.86)):
            Circle(F0_R_3, mode=Mode.SUBTRACT)
    extrude(amount=F1_DEPTH)

    # F0 (on Top) → F2 (join)
    with BuildSketch(Plane.XY):
        with BuildLine():
            ThreePointArc((39.624, 22.86), (36.5223047028, 24.9955180126), (35.6341162011, 21.336))
            Line((35.6341162011, 21.336), (35.814, 21.336))
            Line((35.814, 21.336), (35.814, 21.1561162011))
            ThreePointArc((35.814, 21.1561162011), (38.271255592, 20.7731770559), (39.624, 22.86))
        make_face()
        with Locations((37.338, 22.86)):
            Circle(F0_R_3, mode=Mode.SUBTRACT)
        with Locations((-37.338, -7.874)):
            Circle(F0_R_2)
        with Locations((-37.338, -7.874)):
            Circle(F0_R_3, mode=Mode.SUBTRACT)
        with BuildLine():
            ThreePointArc((-35.6341162011, 21.336), (-35.2024819874, 22.0443047028), (-35.052, 22.86))
            ThreePointArc((-35.052, 22.86), (-39.4248229441, 23.793255592), (-35.814, 21.1561162011))
            Line((-35.814, 21.1561162011), (-35.814, 21.336))
            Line((-35.814, 21.336), (-35.6341162011, 21.336))
        make_face()
        with Locations((-37.338, 22.86)):
            Circle(F0_R_3, mode=Mode.SUBTRACT)
        with BuildLine():
            ThreePointArc((39.624, -7.874), (35.72155391, -6.2575538864), (37.3379999666, -10.16))
            ThreePointArc((37.3379999666, -10.16), (38.95444609, -9.4904461136), (39.624, -7.874))
        make_face()
        with Locations((37.338, -7.874)):
            Circle(F0_R_3, mode=Mode.SUBTRACT)
    extrude(amount=-F2_DEPTH)


solid = f1.part
